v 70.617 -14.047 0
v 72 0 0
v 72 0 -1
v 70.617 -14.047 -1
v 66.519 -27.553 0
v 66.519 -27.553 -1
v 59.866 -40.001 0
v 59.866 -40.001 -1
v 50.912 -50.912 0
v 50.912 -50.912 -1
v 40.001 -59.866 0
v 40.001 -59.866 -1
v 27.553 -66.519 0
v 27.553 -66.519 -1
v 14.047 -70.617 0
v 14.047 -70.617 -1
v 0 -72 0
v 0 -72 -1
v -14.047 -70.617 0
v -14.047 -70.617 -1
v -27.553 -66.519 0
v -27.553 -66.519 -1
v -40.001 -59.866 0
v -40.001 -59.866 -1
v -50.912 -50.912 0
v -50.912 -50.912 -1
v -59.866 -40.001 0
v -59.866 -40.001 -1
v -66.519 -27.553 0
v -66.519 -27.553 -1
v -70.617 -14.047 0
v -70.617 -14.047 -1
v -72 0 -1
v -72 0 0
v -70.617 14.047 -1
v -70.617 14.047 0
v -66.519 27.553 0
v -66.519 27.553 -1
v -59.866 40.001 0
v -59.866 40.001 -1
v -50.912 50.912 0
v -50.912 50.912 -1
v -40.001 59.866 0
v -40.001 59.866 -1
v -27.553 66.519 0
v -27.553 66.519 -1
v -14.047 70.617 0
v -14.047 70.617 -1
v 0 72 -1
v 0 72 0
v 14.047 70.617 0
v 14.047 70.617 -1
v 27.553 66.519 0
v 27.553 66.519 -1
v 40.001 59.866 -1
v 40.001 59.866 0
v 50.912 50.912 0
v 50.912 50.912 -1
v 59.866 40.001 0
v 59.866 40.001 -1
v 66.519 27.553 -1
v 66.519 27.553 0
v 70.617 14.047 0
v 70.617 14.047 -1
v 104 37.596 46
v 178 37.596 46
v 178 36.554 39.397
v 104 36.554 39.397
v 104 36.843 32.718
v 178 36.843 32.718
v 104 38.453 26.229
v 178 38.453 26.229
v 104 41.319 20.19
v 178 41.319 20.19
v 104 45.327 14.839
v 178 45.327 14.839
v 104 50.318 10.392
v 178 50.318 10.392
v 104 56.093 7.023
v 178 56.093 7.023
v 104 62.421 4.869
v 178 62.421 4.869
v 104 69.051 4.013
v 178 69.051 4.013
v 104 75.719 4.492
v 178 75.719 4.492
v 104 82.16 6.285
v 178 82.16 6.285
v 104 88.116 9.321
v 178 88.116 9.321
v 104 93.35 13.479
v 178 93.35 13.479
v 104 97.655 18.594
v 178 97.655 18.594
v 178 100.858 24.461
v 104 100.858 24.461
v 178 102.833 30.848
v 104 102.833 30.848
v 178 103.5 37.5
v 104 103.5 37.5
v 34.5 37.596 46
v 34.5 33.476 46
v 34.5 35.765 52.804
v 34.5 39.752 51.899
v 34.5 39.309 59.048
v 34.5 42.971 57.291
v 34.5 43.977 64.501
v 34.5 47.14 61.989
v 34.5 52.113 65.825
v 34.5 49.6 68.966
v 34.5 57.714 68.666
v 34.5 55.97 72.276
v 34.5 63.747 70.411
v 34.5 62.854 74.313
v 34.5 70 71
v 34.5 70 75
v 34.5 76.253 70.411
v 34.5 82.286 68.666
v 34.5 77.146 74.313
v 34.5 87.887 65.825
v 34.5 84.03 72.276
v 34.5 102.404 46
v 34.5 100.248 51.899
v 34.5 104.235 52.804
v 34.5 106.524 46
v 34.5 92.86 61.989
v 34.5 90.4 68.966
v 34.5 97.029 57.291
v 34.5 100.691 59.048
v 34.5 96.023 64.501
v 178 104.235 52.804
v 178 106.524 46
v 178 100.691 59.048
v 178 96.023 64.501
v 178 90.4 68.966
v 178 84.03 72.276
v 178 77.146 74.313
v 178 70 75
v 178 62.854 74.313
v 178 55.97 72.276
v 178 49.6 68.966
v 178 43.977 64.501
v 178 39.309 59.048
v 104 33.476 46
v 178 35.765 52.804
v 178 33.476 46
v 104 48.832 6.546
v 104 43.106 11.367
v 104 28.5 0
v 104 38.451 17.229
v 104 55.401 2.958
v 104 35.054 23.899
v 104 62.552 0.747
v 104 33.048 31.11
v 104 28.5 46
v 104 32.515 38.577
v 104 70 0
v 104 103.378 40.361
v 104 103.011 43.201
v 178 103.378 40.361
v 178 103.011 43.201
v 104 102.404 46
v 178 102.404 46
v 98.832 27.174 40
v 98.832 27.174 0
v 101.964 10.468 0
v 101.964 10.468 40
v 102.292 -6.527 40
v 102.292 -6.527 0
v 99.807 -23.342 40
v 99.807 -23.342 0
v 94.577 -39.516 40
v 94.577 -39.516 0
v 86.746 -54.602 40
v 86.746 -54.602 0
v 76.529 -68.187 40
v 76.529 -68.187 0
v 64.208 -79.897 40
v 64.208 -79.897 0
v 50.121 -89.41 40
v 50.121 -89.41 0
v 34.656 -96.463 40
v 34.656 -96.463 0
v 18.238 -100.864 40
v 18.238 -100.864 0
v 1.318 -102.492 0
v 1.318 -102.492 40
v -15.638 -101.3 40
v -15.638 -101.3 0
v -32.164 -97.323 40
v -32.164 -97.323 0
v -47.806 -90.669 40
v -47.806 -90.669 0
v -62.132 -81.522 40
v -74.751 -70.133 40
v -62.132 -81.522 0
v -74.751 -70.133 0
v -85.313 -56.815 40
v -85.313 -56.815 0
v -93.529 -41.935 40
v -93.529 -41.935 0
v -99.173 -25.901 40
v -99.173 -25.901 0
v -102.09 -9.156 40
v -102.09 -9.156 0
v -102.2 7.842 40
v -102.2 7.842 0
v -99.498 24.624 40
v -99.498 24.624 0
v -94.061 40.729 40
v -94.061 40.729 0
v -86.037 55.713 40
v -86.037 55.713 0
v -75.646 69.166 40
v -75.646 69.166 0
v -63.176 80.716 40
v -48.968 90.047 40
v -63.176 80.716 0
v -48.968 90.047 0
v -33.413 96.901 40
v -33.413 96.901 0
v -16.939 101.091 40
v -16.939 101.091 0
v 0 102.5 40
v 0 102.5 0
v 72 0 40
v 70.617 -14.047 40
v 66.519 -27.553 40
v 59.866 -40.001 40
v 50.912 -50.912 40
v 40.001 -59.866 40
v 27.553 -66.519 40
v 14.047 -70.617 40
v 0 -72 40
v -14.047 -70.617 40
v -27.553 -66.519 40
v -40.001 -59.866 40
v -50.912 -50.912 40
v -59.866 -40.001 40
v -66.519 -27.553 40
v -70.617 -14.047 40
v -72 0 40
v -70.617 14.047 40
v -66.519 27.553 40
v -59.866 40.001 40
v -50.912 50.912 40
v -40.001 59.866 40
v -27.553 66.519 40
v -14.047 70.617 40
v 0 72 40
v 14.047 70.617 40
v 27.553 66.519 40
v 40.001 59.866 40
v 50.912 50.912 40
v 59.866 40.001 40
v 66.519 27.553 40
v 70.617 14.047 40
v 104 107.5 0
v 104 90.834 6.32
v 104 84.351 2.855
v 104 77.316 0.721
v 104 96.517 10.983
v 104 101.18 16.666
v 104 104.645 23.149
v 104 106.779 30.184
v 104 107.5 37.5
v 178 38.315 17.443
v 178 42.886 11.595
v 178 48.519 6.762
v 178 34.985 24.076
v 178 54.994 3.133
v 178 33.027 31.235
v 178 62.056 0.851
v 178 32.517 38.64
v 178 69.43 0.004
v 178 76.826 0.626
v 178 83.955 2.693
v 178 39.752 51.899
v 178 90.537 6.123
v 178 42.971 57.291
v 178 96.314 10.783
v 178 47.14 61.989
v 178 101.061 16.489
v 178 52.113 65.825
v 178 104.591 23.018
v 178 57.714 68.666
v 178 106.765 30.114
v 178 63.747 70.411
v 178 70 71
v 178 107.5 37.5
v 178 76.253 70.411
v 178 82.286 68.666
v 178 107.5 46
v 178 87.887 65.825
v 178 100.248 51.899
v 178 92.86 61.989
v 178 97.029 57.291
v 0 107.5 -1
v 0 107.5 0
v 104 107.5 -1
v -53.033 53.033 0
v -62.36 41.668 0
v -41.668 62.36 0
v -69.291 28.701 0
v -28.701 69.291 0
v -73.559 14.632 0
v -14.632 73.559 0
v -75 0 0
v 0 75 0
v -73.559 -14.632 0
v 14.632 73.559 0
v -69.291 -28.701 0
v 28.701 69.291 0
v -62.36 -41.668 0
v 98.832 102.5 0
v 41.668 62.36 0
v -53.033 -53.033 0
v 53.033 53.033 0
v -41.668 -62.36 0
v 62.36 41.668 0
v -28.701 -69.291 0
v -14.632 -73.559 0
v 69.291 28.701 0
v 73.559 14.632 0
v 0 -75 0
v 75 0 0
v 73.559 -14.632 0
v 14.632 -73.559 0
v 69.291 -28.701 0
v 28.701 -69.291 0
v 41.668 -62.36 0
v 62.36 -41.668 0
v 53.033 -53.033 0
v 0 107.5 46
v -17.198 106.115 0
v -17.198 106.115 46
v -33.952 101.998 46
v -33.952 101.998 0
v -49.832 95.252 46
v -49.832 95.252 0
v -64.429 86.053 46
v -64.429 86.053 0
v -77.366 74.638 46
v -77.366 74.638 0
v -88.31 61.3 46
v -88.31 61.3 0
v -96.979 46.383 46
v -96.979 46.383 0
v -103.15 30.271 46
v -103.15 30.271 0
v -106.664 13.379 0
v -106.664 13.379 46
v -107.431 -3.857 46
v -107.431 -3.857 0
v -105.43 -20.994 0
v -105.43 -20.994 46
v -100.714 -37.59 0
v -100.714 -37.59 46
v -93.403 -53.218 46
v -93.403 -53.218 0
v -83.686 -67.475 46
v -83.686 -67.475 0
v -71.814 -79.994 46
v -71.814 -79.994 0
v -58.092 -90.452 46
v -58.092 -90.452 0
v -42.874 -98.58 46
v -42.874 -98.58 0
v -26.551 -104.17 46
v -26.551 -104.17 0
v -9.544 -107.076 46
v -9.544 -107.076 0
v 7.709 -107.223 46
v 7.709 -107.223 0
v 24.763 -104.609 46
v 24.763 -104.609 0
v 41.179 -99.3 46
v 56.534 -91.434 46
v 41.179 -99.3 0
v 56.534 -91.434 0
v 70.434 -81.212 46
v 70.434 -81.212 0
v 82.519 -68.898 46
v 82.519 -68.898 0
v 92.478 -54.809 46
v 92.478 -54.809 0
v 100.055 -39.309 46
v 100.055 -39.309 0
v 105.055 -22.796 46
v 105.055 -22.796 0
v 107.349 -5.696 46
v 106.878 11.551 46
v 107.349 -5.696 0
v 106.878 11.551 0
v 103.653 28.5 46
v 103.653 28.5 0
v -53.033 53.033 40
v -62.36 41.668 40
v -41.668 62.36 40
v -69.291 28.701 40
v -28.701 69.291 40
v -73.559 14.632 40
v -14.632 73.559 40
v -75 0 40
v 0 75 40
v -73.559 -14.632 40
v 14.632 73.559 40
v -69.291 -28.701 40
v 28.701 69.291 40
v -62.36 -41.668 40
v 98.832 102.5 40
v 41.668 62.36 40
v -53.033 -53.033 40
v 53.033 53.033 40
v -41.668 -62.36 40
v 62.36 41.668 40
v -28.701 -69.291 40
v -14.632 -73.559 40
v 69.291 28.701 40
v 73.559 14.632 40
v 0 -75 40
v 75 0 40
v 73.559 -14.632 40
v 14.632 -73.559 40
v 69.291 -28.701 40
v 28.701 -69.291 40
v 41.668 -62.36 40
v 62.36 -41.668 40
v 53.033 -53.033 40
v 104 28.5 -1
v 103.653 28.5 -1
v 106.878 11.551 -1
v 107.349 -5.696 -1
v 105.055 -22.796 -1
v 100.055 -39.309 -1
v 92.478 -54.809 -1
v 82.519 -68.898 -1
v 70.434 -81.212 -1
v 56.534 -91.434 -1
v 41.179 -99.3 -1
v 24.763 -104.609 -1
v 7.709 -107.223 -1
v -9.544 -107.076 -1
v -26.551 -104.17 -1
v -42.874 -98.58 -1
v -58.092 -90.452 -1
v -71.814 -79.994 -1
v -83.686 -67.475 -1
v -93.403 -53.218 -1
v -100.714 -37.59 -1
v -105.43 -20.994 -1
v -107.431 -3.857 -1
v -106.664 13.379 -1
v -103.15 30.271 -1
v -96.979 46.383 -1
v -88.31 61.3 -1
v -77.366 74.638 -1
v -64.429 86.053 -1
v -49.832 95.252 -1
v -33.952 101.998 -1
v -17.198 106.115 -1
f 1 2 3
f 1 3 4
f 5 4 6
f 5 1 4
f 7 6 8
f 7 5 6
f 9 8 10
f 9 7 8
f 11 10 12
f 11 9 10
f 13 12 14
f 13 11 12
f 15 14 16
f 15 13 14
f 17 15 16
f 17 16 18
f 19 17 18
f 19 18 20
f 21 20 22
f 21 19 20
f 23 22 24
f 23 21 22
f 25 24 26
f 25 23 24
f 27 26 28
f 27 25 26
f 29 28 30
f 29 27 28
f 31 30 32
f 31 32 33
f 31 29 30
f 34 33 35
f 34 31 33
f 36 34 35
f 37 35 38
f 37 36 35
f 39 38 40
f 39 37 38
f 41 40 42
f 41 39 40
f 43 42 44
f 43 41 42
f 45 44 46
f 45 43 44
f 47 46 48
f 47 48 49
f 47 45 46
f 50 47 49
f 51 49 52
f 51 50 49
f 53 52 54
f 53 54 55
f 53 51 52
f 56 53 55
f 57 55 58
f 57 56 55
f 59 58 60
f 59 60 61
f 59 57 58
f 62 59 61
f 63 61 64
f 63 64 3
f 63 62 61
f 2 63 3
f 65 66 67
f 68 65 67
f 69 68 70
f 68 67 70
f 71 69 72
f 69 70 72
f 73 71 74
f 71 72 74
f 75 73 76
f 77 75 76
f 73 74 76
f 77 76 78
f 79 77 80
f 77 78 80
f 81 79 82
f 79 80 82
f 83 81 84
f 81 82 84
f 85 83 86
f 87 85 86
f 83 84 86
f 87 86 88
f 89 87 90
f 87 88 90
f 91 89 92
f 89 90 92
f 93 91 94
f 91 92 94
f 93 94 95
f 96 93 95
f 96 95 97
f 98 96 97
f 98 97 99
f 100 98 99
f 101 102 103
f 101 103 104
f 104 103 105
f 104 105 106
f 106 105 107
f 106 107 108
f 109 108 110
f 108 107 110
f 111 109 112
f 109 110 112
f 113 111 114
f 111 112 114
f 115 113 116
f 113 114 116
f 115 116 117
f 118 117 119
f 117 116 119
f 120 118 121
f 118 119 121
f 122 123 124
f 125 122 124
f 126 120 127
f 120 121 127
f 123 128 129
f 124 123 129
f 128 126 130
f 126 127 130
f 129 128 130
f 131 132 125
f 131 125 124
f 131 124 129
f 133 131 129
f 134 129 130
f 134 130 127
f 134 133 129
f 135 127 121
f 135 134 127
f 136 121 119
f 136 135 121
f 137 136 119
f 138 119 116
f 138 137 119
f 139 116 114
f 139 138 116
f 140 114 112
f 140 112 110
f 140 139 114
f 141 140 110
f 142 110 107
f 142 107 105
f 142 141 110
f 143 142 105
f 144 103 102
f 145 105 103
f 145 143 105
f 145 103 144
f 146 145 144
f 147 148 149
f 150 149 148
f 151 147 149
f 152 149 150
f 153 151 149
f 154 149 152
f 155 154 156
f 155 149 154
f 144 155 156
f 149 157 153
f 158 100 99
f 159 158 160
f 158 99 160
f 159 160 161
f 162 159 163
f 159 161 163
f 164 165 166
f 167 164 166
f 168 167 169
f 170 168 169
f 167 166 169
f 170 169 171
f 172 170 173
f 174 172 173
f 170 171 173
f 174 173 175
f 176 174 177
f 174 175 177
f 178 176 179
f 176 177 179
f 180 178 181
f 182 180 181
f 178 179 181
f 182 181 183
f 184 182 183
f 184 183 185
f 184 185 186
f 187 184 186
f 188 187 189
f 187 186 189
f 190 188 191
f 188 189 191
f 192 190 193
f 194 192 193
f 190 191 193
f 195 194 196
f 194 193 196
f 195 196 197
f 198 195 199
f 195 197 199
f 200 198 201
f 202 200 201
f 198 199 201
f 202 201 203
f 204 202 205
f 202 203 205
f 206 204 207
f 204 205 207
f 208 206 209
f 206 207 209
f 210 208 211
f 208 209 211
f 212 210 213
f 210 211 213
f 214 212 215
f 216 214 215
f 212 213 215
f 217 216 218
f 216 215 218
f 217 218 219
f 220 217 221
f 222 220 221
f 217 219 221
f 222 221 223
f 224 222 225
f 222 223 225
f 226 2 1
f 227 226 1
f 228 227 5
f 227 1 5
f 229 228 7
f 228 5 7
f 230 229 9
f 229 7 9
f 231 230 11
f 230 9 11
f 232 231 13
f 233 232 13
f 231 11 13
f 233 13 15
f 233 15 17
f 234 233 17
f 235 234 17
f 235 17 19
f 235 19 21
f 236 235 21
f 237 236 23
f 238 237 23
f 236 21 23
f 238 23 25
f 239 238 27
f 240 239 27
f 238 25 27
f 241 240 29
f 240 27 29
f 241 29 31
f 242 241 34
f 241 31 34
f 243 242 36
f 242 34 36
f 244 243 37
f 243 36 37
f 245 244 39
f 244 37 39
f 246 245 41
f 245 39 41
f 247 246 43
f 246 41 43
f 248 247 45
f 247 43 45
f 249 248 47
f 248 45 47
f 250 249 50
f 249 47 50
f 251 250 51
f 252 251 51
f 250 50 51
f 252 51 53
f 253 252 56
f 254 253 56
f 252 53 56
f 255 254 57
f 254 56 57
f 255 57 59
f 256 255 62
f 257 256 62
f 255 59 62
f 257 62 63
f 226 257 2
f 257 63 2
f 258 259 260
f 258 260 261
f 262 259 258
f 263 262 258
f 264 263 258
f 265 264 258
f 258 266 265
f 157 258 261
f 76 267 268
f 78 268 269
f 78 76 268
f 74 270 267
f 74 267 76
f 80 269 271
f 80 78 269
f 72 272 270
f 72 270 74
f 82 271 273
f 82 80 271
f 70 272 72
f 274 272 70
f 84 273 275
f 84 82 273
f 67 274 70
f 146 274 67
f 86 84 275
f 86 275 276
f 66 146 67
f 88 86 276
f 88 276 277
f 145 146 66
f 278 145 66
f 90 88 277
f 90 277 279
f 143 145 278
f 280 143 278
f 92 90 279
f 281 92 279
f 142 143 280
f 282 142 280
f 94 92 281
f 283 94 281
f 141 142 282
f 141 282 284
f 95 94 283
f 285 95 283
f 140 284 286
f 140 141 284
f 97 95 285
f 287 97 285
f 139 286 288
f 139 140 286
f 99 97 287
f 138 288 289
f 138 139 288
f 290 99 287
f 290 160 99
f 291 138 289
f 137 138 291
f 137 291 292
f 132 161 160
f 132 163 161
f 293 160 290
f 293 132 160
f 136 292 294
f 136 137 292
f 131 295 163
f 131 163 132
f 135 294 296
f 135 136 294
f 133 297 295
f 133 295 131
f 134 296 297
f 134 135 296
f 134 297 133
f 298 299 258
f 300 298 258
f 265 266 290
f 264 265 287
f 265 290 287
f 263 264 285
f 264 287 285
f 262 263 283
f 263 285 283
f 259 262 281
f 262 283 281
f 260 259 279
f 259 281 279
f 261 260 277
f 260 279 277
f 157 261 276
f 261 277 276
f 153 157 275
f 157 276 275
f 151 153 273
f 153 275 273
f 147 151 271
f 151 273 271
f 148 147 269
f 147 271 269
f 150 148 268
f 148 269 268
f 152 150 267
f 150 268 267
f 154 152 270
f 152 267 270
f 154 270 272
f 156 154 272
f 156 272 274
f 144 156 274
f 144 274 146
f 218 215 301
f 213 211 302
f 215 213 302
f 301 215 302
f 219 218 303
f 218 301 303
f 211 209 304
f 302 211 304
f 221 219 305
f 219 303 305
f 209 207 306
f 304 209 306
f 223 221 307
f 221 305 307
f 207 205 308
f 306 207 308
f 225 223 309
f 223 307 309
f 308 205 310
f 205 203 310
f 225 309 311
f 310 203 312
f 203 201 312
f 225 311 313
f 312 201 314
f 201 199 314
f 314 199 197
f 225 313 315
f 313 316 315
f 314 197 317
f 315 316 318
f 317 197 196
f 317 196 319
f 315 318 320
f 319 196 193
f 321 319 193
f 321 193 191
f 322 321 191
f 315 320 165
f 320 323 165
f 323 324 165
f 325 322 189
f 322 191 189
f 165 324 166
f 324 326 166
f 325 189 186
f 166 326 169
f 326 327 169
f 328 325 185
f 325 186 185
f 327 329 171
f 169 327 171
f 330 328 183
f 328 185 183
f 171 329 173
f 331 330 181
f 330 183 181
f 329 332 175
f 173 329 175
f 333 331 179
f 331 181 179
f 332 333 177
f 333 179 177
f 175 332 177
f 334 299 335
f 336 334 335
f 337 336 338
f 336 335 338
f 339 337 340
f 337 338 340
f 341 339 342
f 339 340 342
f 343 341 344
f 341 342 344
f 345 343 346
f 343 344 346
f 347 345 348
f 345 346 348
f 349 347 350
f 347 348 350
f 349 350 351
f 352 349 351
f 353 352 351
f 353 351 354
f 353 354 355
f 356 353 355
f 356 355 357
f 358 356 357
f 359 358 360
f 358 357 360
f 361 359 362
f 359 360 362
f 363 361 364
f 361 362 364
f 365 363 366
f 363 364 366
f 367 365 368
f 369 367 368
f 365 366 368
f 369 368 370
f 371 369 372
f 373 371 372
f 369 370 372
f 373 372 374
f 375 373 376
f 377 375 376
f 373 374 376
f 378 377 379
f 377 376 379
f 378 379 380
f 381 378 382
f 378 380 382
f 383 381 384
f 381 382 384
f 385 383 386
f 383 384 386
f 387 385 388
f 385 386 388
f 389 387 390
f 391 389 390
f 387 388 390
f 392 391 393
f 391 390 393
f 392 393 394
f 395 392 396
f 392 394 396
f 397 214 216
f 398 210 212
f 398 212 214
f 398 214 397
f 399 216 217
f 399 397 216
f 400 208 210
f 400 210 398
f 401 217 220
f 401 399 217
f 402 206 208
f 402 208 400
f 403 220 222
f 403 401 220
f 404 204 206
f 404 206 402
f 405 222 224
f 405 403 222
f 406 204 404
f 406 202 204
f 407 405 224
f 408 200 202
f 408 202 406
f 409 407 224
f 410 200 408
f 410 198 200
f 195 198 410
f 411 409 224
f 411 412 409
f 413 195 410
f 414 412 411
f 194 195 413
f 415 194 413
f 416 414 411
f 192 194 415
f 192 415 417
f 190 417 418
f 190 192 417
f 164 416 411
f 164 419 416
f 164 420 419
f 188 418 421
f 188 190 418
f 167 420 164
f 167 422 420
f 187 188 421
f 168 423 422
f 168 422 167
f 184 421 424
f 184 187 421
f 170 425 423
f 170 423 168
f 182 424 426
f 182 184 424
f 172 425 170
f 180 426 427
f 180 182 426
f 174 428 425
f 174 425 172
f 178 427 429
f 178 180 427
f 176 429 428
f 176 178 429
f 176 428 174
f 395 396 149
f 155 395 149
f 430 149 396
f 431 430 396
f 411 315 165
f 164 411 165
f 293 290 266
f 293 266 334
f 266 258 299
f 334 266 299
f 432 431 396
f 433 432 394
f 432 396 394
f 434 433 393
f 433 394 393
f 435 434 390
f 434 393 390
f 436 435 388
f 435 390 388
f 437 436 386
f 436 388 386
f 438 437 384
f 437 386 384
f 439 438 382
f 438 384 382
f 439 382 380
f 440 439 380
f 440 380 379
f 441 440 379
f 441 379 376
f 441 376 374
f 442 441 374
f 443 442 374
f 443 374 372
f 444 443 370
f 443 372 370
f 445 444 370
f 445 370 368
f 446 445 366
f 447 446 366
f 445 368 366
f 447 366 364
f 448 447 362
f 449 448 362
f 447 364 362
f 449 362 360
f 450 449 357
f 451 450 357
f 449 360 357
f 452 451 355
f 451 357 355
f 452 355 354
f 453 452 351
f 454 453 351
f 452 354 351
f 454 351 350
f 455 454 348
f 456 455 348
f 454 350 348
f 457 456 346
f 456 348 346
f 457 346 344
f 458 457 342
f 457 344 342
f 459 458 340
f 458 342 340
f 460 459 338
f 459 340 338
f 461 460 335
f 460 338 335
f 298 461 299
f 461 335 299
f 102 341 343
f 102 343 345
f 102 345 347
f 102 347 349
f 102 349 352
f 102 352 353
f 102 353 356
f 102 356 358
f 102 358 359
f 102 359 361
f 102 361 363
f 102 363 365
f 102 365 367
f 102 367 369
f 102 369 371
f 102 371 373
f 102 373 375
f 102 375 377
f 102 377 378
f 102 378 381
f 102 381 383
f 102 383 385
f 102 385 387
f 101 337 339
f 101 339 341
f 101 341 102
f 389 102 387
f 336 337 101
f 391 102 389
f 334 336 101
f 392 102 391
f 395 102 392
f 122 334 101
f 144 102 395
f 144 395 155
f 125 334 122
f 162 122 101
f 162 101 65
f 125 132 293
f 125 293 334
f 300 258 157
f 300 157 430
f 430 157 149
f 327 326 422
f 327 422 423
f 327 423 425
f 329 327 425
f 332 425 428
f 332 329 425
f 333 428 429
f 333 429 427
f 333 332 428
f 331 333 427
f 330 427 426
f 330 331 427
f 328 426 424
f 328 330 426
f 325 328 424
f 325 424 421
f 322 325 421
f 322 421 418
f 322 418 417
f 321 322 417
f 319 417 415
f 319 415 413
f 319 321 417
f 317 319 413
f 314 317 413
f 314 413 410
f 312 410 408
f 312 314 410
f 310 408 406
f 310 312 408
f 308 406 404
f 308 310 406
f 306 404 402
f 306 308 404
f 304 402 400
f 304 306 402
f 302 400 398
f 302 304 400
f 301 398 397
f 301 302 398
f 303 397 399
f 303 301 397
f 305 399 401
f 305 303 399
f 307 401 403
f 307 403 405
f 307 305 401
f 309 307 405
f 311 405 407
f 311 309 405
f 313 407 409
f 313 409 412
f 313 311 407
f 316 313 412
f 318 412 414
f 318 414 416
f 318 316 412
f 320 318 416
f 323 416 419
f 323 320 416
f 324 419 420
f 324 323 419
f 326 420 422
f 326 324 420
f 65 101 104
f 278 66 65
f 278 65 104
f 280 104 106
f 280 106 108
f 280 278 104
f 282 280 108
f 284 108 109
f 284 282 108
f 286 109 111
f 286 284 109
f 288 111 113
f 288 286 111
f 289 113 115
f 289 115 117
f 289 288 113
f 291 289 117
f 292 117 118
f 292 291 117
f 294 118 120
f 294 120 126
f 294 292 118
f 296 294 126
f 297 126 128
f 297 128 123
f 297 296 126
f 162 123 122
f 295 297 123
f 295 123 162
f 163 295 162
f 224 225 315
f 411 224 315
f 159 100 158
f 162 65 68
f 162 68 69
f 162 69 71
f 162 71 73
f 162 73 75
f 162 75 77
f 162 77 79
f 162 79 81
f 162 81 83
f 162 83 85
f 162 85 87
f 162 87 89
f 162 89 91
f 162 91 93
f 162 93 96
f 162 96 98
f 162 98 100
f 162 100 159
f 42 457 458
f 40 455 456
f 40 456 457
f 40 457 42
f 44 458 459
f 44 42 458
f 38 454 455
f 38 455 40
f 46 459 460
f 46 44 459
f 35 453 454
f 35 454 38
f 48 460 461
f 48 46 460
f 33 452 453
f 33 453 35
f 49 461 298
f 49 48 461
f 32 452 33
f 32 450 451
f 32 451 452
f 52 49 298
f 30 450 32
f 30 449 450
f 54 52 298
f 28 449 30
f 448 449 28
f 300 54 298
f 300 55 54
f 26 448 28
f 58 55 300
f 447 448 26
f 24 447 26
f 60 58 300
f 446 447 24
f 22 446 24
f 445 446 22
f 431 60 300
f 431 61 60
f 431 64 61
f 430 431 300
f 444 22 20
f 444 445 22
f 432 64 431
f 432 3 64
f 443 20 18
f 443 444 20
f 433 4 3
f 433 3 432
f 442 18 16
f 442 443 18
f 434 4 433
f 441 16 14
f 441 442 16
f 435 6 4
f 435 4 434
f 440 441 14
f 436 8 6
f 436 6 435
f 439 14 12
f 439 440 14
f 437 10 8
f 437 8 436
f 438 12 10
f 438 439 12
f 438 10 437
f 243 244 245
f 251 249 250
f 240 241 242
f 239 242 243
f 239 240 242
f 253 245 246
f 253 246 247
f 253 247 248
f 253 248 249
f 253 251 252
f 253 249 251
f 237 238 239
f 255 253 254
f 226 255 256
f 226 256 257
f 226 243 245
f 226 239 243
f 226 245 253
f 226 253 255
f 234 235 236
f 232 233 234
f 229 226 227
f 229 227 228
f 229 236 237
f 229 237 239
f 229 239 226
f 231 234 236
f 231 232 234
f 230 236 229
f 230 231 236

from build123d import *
from build123d import SkipClean  # not in build123d's __all__

# Parameters (mm, degrees)
F1_DEPTH = 46
F3_DEPTH = 74
F4_DEPTH = 143.5
F5_R     = 75
F5_R_2   = 72
F6_DEPTH = 40
F7_R     = 72
F8_DEPTH = 1


# Not quite as in the source:
# - after a boolean that leaves OpenCascade's solid faulty, fix() repairs it


with BuildPart() as f1:
    # F0 (on Top) → F1 (new body)
    with BuildSketch(Plane.XY):
        with BuildLine():
            Line((178, 107.5), (0, 107.5))
            ThreePointArc((0, 107.5), (-65.1632565178, -85.4985379992), (103.6532681588, 28.5))
            Line((103.6532681588, 28.5), (178, 28.5))
            Line((178, 28.5), (178, 107.5))
        make_face()
    extrude(amount=F1_DEPTH)

    # F2 (on face) → F3 (cut)
    with BuildSketch(Plane.YZ.offset(178)):
        with BuildLine():
            ThreePointArc((70, 0), (40.6316496888, 14.1815523673), (33.4760352645, 46))
            Line((33.4760352645, 46), (28.5, 46))
            Line((28.5, 46), (28.5, 0))
            Line((28.5, 0), (70, 0))
        make_face()
        with BuildLine():
            Line((107.5, 0), (107.5, 37.5))
            ThreePointArc((107.5, 37.5), (96.5165042945, 10.9834957055), (70, 0))
            Line((70, 0), (107.5, 0))
        make_face()
        with BuildLine():
            ThreePointArc((37.596296508, 46), (65.714796795, 4.275204538), (103.5, 37.5))
            ThreePointArc((103.5, 37.5), (103.224795462, 41.785203205), (102.403703492, 46))
            Line((102.403703492, 46), (37.596296508, 46))
        make_face()
    extrude(amount=-F3_DEPTH, mode=Mode.SUBTRACT)

    # F2 (on face) → F4 (join)
    with BuildSketch(Plane.YZ.offset(178)):
        with BuildLine():
            ThreePointArc((37.596296508, 46), (70, 71), (102.403703492, 46))
            Line((102.403703492, 46), (106.5239647355, 46))
            ThreePointArc((106.5239647355, 46), (70, 75), (33.4760352645, 46))
            Line((33.4760352645, 46), (37.596296508, 46))
        make_face()
    with SkipClean():  # cleaning this boolean's faces spoils the solid; the shape is the same uncleaned
        extrude(amount=-F4_DEPTH)

    # F5 (on face) → F6 (cut)
    with BuildSketch(Plane(origin=(0, 0, 0), x_dir=(1, 0, 0), z_dir=(0, 0, -1))):
        with BuildLine():
            ThreePointArc((98.8321859189, -27.1744186047), (-62.1324073774, 81.5218618132), (0, -102.5))
            Line((0, -102.5), (98.8321859189, -102.5))
            Line((98.8321859189, -102.5), (98.8321859189, -27.1744186047))
        make_face()
        Circle(F5_R, mode=Mode.SUBTRACT)
        Circle(F5_R_2)
    extrude(amount=-F6_DEPTH, mode=Mode.SUBTRACT)

    add(f1.part.fix(), mode=Mode.REPLACE)

    # F7 (on face) → F8 (join)
    with BuildSketch(Plane(origin=(0, 0, 0), x_dir=(1, 0, 0), z_dir=(0, 0, -1))):
        with BuildLine():
            ThreePointArc((103.6532681588, -28.5), (-65.1632565178, 85.4985379992), (0, -107.5))
            Line((0, -107.5), (104, -107.5))
            Line((104, -107.5), (104, -70))
            Line((104, -70), (104, -28.5))
            Line((104, -28.5), (103.6532681588, -28.5))
        make_face()
        with BuildLine():
            ThreePointArc((0, -102.5), (-62.1324073774, 81.5218618132), (98.8321859189, -27.1744186047))
            Line((98.8321859189, -27.1744186047), (98.8321859189, -102.5))
            Line((98.8321859189, -102.5), (0, -102.5))
        make_face(mode=Mode.SUBTRACT)
        with BuildLine():
            Line((98.8321859189, -102.5), (98.8321859189, -27.1744186047))
            ThreePointArc((98.8321859189, -27.1744186047), (-62.1324073774, 81.5218618132), (0, -102.5))
            Line((0, -102.5), (98.8321859189, -102.5))
        make_face()
        Circle(F7_R, mode=Mode.SUBTRACT)
    extrude(amount=F8_DEPTH)


solid = f1.part
